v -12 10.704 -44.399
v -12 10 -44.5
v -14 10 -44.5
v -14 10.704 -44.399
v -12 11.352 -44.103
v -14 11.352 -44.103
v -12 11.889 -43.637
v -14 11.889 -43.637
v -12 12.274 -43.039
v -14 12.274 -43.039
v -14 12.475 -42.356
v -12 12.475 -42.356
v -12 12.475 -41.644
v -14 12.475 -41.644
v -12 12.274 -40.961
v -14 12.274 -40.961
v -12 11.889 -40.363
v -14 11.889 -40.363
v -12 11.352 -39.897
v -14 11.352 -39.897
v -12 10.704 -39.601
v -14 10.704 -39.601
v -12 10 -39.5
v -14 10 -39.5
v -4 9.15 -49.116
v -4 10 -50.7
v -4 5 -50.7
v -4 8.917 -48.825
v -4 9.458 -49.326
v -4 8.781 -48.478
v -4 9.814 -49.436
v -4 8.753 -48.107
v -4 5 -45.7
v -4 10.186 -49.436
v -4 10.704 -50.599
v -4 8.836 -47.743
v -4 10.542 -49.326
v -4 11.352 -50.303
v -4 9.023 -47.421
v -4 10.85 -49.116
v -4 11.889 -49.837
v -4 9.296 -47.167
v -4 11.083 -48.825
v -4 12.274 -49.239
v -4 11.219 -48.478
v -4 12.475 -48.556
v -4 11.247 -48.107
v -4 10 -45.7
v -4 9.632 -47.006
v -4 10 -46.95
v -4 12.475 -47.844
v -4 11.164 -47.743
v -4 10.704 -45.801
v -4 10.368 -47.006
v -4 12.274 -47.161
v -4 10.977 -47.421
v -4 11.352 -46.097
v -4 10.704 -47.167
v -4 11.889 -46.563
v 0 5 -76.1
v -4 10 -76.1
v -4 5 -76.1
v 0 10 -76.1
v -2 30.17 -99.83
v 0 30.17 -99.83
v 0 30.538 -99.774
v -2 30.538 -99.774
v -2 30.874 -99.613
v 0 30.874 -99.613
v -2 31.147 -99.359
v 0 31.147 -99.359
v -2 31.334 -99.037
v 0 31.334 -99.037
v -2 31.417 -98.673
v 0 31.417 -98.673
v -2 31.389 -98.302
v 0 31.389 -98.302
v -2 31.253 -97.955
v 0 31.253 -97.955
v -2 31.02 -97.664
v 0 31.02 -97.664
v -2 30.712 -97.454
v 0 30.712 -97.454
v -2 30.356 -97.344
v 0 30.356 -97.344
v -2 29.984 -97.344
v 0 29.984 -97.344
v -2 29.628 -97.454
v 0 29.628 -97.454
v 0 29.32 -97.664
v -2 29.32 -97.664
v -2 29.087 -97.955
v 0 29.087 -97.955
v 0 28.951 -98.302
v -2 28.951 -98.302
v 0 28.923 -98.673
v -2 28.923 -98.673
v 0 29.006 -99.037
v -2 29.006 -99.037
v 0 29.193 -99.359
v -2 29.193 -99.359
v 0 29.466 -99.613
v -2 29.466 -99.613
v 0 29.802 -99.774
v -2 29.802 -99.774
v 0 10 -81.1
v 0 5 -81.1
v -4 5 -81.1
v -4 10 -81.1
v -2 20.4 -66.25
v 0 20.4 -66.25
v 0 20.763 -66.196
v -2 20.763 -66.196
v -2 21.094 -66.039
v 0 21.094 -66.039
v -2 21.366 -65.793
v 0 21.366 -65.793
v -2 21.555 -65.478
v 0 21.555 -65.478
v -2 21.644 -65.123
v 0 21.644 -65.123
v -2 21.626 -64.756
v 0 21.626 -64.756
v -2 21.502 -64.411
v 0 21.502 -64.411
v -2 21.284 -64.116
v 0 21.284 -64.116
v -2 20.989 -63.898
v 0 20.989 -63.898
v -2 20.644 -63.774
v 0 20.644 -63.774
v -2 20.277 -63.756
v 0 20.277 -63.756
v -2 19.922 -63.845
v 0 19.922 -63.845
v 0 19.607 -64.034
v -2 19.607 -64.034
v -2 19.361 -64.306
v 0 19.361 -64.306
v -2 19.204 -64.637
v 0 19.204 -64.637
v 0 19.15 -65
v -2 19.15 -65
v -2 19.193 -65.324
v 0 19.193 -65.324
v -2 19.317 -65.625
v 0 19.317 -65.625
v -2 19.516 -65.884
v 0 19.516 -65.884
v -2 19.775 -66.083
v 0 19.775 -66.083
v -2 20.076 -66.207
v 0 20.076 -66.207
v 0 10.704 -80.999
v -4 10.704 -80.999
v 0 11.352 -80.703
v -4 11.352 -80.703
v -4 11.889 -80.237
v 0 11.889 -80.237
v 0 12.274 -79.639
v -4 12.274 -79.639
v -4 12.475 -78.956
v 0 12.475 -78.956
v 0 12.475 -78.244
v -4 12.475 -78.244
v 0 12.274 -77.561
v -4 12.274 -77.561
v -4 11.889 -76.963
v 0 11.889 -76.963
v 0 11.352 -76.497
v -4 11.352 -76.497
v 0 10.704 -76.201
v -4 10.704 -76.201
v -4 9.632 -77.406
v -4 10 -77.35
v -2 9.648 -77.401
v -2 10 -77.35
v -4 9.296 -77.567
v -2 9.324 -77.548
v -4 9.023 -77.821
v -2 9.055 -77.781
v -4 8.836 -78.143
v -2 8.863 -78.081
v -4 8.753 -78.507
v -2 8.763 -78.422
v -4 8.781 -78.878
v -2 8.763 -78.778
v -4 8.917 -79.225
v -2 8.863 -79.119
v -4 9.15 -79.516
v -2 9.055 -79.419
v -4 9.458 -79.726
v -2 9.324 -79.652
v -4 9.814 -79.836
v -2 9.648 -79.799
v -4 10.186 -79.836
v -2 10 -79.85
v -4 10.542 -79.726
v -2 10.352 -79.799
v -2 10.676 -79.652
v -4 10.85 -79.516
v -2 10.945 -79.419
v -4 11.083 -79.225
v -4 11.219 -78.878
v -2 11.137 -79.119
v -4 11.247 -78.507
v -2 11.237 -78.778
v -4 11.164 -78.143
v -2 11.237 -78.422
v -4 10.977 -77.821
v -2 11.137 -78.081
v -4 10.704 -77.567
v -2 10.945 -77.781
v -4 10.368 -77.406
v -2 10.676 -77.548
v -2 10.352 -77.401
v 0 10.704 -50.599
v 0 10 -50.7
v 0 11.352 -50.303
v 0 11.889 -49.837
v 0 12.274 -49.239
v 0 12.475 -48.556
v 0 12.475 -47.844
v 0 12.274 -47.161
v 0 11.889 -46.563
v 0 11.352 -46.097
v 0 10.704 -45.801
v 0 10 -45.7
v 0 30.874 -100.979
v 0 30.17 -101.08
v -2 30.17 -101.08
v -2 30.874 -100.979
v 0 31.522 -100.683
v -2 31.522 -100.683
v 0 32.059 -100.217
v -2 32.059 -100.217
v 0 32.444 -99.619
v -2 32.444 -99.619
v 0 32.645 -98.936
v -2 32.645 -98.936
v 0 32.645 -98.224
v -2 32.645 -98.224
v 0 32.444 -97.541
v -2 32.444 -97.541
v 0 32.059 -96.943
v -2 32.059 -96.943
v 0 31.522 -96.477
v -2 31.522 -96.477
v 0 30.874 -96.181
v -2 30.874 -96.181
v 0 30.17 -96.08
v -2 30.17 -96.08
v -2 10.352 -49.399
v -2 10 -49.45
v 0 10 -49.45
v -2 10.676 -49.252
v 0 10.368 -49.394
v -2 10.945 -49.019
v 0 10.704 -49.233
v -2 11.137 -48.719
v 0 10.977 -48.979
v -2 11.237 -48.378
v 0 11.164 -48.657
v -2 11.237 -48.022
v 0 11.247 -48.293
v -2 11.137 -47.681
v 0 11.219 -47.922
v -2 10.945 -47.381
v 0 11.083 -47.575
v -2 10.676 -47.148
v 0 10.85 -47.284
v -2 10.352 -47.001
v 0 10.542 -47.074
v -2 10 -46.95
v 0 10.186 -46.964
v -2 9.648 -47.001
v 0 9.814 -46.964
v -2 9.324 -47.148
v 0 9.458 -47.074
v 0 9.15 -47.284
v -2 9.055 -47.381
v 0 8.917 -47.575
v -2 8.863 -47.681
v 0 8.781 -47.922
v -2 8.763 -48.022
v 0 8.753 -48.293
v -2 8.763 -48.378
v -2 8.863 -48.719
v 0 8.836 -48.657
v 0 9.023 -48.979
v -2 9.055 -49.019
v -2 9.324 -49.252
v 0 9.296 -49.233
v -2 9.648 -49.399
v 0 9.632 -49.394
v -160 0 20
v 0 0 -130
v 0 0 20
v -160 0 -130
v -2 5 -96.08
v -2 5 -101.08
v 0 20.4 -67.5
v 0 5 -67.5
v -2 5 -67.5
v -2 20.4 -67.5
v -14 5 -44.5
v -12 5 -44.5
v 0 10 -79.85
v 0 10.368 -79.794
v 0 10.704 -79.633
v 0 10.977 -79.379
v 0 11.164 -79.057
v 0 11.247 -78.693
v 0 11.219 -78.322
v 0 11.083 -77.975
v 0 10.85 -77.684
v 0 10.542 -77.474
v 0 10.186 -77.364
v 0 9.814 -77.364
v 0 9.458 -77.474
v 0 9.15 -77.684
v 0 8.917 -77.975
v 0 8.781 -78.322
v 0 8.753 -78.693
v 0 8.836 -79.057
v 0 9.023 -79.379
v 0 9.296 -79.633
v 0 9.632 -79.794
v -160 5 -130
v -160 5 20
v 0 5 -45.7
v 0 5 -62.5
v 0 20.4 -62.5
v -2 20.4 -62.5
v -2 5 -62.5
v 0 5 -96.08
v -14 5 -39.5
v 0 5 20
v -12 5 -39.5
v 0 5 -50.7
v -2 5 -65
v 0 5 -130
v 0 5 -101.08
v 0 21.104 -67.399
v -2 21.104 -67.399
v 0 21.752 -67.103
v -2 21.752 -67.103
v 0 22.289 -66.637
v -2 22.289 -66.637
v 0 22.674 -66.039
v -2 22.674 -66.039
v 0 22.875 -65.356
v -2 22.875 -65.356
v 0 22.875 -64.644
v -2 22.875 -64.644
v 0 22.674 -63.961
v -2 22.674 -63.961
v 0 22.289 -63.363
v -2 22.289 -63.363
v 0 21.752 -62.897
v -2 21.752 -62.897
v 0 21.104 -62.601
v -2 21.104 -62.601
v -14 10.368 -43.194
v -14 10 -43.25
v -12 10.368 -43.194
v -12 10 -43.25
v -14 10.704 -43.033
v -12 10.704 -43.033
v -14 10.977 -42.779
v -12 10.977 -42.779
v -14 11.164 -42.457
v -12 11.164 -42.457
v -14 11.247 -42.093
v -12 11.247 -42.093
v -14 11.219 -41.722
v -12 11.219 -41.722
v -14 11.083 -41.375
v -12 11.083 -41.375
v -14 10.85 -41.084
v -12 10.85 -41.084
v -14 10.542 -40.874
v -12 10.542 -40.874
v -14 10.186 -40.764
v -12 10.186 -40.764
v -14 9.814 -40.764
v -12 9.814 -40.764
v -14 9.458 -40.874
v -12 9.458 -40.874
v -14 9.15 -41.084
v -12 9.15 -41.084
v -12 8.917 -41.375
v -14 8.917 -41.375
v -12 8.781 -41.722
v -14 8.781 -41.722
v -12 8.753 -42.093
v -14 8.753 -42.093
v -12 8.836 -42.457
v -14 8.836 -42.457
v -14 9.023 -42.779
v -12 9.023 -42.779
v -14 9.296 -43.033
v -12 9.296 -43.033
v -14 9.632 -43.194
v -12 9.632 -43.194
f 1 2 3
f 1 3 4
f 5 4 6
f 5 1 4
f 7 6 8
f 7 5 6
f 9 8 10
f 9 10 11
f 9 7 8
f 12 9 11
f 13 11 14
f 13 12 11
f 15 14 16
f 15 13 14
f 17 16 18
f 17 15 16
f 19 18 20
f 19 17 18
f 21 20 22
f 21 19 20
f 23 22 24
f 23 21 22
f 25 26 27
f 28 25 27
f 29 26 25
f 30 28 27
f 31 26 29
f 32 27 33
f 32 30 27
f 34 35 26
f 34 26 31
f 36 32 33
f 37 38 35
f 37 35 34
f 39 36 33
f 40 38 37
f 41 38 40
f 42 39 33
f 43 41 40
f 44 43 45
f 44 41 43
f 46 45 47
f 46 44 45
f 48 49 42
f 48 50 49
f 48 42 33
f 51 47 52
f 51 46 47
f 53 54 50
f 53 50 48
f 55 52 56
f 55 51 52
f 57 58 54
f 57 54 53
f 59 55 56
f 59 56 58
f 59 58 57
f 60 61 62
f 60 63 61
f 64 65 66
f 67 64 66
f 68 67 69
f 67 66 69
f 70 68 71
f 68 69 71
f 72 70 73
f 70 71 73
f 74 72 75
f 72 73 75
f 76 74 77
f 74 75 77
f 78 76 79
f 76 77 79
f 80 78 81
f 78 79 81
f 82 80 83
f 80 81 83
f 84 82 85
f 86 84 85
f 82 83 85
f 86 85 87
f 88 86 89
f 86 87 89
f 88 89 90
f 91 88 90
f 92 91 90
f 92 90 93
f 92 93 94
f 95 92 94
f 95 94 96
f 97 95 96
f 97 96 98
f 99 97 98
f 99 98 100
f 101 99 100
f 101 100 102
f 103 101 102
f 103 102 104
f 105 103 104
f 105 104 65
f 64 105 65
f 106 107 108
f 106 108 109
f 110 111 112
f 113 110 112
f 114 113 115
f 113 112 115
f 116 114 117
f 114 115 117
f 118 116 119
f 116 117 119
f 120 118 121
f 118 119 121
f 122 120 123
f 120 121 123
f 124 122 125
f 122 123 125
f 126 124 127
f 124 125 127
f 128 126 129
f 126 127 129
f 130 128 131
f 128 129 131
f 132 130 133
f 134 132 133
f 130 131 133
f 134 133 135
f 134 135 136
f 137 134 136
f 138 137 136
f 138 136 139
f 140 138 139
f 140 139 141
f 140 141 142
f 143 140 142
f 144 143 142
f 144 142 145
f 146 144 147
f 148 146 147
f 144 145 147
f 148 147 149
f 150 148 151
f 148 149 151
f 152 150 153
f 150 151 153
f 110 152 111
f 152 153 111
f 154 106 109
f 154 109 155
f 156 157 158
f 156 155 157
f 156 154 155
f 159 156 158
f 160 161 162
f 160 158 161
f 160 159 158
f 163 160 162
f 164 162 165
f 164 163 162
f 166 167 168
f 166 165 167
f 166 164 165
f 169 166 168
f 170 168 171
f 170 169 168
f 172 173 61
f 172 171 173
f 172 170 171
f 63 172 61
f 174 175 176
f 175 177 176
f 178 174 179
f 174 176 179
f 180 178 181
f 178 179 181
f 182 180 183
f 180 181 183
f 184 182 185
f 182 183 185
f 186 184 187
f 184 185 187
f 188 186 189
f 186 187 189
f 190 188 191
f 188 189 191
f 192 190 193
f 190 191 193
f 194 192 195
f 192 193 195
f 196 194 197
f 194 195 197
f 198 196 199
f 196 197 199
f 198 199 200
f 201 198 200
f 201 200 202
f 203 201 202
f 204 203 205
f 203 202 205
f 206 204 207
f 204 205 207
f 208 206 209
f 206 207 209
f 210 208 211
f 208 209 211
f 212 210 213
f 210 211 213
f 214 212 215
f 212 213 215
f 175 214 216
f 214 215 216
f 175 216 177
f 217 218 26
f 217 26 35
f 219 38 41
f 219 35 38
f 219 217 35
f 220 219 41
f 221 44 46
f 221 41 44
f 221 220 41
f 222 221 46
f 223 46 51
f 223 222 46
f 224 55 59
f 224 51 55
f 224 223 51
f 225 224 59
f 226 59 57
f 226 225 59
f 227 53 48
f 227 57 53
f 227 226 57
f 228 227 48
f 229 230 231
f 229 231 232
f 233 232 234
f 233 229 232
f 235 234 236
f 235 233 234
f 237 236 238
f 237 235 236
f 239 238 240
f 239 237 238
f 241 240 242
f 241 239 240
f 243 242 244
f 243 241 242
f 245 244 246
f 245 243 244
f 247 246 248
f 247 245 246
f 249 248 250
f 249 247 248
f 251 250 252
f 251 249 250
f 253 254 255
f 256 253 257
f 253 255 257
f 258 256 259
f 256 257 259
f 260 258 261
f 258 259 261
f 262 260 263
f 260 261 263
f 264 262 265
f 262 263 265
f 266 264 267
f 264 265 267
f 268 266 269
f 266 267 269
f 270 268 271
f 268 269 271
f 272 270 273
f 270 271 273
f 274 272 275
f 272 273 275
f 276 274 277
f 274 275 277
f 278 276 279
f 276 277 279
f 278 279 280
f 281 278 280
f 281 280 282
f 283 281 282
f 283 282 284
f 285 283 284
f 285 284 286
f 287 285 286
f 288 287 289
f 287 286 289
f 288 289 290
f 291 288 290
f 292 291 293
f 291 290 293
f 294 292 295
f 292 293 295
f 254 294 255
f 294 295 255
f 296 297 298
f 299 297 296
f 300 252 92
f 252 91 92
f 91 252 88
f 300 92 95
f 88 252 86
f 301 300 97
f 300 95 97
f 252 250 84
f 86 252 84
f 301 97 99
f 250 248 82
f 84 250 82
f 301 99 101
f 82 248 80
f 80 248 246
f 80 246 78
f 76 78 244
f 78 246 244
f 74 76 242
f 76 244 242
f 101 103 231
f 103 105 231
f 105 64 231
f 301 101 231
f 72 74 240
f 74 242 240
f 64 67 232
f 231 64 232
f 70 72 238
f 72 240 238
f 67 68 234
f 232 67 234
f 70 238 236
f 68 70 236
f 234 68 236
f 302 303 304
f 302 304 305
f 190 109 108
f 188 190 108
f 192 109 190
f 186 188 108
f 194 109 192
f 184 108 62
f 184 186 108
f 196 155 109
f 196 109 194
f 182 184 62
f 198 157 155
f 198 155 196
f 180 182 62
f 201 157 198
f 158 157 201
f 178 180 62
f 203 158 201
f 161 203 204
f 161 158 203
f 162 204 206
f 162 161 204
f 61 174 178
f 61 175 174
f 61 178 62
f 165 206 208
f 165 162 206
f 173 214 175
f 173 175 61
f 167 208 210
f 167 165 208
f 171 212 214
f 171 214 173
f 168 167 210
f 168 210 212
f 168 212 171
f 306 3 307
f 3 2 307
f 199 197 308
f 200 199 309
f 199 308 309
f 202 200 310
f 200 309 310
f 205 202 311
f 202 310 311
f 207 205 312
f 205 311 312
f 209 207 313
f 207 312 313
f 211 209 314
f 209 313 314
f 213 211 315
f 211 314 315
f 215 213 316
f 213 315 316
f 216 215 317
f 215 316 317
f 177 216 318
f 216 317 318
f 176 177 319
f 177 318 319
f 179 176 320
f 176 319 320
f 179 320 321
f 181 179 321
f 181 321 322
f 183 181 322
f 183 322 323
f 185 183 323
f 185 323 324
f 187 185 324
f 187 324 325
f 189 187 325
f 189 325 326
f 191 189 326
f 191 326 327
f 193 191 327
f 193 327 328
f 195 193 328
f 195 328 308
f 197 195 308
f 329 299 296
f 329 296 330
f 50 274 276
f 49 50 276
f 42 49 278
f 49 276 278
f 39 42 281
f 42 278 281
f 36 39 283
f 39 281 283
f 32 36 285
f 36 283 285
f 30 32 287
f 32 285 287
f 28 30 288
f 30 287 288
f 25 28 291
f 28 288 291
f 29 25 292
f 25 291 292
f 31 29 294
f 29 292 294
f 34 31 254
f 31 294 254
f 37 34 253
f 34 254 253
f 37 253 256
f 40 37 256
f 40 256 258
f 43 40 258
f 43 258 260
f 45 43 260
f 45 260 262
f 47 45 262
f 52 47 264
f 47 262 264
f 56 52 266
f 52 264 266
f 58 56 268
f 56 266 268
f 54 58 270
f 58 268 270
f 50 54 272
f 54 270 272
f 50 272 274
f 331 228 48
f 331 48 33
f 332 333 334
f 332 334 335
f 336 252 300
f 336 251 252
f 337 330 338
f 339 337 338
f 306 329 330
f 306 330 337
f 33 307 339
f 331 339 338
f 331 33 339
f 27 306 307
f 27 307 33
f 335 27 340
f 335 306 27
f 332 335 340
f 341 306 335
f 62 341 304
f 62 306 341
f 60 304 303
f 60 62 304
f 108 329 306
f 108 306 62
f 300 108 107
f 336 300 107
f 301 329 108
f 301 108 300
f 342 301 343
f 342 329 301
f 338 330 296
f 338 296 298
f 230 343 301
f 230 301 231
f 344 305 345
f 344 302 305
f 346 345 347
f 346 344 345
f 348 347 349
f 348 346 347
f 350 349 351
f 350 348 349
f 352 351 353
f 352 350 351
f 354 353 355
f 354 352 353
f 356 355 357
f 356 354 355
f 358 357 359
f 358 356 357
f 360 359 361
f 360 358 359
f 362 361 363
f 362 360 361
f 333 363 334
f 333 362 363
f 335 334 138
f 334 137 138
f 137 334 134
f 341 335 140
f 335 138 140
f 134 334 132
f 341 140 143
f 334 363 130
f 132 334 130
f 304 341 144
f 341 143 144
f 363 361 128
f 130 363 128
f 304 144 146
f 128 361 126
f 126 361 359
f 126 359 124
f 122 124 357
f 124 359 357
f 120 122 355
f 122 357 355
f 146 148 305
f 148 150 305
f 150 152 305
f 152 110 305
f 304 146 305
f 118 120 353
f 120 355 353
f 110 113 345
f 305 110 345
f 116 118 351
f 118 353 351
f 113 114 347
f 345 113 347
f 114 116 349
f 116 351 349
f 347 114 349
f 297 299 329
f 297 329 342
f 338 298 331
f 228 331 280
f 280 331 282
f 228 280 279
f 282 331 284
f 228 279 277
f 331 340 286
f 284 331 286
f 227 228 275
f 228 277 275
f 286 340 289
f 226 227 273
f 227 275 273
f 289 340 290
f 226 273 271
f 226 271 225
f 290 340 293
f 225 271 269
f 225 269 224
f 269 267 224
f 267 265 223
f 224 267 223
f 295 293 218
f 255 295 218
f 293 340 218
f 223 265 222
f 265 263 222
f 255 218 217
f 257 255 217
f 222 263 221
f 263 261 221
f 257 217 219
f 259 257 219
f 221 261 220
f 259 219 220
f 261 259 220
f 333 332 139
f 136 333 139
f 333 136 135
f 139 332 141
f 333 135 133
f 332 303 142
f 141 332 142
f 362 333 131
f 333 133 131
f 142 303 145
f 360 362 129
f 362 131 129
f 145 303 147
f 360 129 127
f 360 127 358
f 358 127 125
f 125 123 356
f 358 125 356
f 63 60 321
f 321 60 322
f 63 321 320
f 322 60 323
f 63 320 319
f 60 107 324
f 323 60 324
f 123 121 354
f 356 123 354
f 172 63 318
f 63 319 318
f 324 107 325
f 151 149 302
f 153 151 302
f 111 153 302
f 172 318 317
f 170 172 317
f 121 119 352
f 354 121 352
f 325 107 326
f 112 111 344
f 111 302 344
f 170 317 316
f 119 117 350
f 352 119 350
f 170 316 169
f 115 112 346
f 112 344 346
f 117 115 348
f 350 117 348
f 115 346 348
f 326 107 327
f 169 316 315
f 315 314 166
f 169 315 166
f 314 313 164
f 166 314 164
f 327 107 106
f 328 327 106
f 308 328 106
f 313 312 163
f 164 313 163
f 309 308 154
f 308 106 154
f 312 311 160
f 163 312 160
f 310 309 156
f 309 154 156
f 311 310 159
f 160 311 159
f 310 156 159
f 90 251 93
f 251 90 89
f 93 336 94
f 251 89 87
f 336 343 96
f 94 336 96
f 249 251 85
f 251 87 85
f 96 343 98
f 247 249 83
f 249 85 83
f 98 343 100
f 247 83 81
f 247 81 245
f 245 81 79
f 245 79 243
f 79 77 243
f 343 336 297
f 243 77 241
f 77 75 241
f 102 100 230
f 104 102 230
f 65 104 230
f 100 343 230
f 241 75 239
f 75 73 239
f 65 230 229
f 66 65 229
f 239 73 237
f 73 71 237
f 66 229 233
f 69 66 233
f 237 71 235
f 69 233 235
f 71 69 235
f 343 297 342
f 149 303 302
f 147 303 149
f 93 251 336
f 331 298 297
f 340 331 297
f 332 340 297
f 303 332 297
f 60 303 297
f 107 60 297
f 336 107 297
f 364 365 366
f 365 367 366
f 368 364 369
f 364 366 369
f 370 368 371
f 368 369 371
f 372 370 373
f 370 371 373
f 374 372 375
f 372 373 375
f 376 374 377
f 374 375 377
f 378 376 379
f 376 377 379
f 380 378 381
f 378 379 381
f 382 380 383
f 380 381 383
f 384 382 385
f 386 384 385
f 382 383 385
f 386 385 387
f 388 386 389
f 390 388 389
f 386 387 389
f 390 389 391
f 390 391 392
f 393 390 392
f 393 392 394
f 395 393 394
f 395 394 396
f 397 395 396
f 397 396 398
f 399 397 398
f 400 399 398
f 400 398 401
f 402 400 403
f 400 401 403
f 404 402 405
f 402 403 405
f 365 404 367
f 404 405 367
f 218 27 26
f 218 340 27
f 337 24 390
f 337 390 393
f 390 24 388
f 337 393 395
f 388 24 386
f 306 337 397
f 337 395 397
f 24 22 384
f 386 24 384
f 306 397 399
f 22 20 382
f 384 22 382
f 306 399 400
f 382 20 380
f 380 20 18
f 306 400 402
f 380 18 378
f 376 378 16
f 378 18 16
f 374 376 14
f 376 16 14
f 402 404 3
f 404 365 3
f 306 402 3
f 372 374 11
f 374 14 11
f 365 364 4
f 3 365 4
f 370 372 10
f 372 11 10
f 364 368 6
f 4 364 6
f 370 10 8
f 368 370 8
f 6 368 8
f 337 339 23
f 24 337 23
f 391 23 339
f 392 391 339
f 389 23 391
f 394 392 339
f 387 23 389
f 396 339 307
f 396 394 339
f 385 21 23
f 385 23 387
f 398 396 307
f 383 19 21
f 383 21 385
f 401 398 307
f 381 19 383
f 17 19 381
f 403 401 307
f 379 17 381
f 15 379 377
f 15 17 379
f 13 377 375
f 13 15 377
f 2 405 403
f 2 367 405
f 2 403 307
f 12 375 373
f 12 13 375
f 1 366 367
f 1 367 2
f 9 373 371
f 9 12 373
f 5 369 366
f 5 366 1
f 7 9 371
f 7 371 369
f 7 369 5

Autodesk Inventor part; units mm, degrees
ref_plane "YZ Plane" through (0, 0, 0) normal (1, 0, 0) x (0, 1, 0)
ref_plane "XZ Plane" through (0, 0, 0) normal (0, 1, 0) x (-1, 0, 0)
sketch "草圖1" plane through (0, 0, 0) normal (0, 1, 0) x (-1, 0, 0)
  line L0 (0, 0) -> (160, 0)
  line L1 (160, 0) -> (160, -130)
  line L2 (160, -130) -> (0, -130)
  line L3 (0, -130) -> (0, 0)
  dimension "d0" = 160
  dimension "d1" = 130
extrude "擠出1" add sketch "草圖1" along normal blind 5
sketch "草圖2" plane through (0, 0, 0) normal (1, 0, 0) x (0, 0, -1)
  line L0 (130, 0) -> (0, 0) projected
  line L1 (65, 0) -> (65, 20.4)
  line L2 (65, 20.4) -> (65, 0) construction
  line L3 (62.5, 20.4) -> (62.5, 0)
  line L4 (67.5, 0) -> (67.5, 20.4)
  arc A0 (67.5, 20.4) -> (62.5, 20.4) centre (65, 20.4) ccw
  arc A1 (62.5, 0) -> (67.5, 0) centre (65, 0) ccw construction
  line L5 (67.5, 0) -> (62.5, 0)
  circle A2 centre (65, 20.4) radius 1.25
  point P0 (65, 10.2)
  dimension "d4" = 20.4
  dimension "d5" = 5
  dimension "d6" = 2.5
extrude "擠出2" add sketch "草圖2" against normal blind 2
sketch "草圖3" plane through (0, 0, 0) normal (1, 0, 0) x (0, 0, -1)
  line L0 (130, 0) -> (0, 0) construction
  arc A0 (67.5, 20.4) -> (62.5, 20.4) centre (65, 20.4) ccw projected
  line L1 (65, 20.4) -> (48.2, 20.4) construction
  line L2 (48.2, 20.4) -> (48.2, 10) construction
  line L3 (48.2, 10) -> (48.2, 0) construction
  line L4 (45.7, 10) -> (45.7, 0)
  line L5 (50.7, 0) -> (50.7, 10)
  arc A1 (50.7, 10) -> (45.7, 10) centre (48.2, 10) ccw
  arc A2 (45.7, 0) -> (50.7, 0) centre (48.2, 0) ccw construction
  circle A3 centre (48.2, 10) radius 1.25
  line L6 (50.7, 0) -> (45.7, 0)
  line L7 (65, 20.4) -> (42, 20.4) construction
  line L8 (42, 20.4) -> (42, 10) construction
  line L9 (42, 10) -> (42, 0) construction
  line L10 (39.5, 10) -> (39.5, 0)
  line L11 (44.5, 0) -> (44.5, 10)
  arc A4 (44.5, 10) -> (39.5, 10) centre (42, 10) ccw
  arc A5 (39.5, 0) -> (44.5, 0) centre (42, 0) ccw construction
  circle A6 centre (42, 10) radius 1.25
  line L12 (44.5, 0) -> (39.5, 0)
  circle A7 centre (65, 20.4) radius 1.25 projected
  line L13 (65, 20.4) -> (78.6, 20.4) construction
  line L14 (78.6, 20.4) -> (78.6, 10) construction
  line L15 (78.6, 10) -> (78.6, 0) construction
  line L16 (76.1, 10) -> (76.1, 0)
  line L17 (81.1, 0) -> (81.1, 10)
  arc A8 (81.1, 10) -> (76.1, 10) centre (78.6, 10) ccw
  arc A9 (76.1, 0) -> (81.1, 0) centre (78.6, 0) ccw construction
  circle A10 centre (78.6, 10) radius 1.25
  line L18 (81.1, 0) -> (76.1, 0)
  line L19 (81.1, 0) -> (76.1, 0)
  line L20 (0, 0) -> (130, 0) projected
  line L21 (65, 20.4) -> (65, 30.17) construction
  line L22 (65, 30.17) -> (98.58, 30.17) construction
  line L23 (98.58, 30.17) -> (98.58, 0) construction
  line L24 (96.08, 30.17) -> (96.08, 0)
  line L25 (101.08, 0) -> (101.08, 30.17)
  arc A11 (101.08, 30.17) -> (96.08, 30.17) centre (98.58, 30.17) ccw
  arc A12 (96.08, 0) -> (101.08, 0) centre (98.58, 0) ccw construction
  circle A13 centre (98.58, 30.17) radius 1.25
  line L26 (101.08, 0) -> (96.08, 0)
  point P0 (48.2, 5)
  point P1 (42, 5)
  point P2 (78.6, 5)
  point P3 (98.58, 15.085)
  dimension "d9" = 16.8
  dimension "d11" = 10.4
  dimension "d12" = 5
  dimension "d13" = 2.5
  dimension "d14" = 23
  dimension "d15" = 10.4
  dimension "d16" = 5
  dimension "d17" = 2.5
  dimension "d20" = 13.6
  dimension "d21" = 10.4
  dimension "d22" = 5
  dimension "d23" = 2.5
  dimension "d24" = 9.77
  dimension "d25" = 33.58
  dimension "d26" = 5
  dimension "d27" = 2.5
extrude "擠出3" add sketch "草圖3" against normal blind 2 contours A1 L5 L6 L4 | L24 A11 L25 L20 | L16 A8 L17 L18 | L12 L10 A4 L11
sketch "草圖4" plane through (-160, 0, 0) normal (0, 0, 1) x (1, 0, 0)
  line L0 (160, 0) -> (0, 0) projected
  line L1 (160, 0) -> (160, 5) projected
  line L2 (0, 5) -> (160, 5) projected
  line L3 (0, 0) -> (0, 5) projected
extrude "擠出4" add sketch "草圖4" along normal blind 20
sketch "草圖5" plane through (-2, 0, 0) normal (-1, 0, 0) x (0, 0, 1)
  line L0 (-45.7, 5) -> (-50.7, 5) projected
  line L1 (-45.7, 5) -> (-45.7, 10) projected
  arc A0 (-45.7, 10) -> (-50.7, 10) centre (-48.2, 10) ccw projected
  line L2 (-50.7, 10) -> (-50.7, 5) projected
  circle A1 centre (-48.2, 10) radius 1.25 projected
  line L3 (-76.1, 5) -> (-81.1, 5) projected
  line L4 (-76.1, 5) -> (-76.1, 10) projected
  arc A2 (-76.1, 10) -> (-81.1, 10) centre (-78.6, 10) ccw projected
  line L5 (-81.1, 10) -> (-81.1, 5) projected
  circle A3 centre (-78.6, 10) radius 1.25 projected
  point P0 (0, 0)
extrude "擠出5" add sketch "草圖5" along normal blind 2
ref_plane "工作平面1" through (-12, 0, -130) normal (1, 0, 0) x (0, 0, -1)
sketch "草圖6" plane through (-12, 0, -130) normal (1, 0, 0) x (0, 0, -1)
  line L0 (-90.5, 5) -> (-85.5, 5) projected
  line L1 (-90.5, 5) -> (-90.5, 10) projected
  arc A0 (-85.5, 10) -> (-90.5, 10) centre (-88, 10) ccw projected
  line L2 (-85.5, 10) -> (-85.5, 5) projected
  circle A1 centre (-88, 10) radius 1.25 projected
  point P0 (-130, 0)
extrude "擠出6" add sketch "草圖6" against normal blind 2
extrude "擠出7" cut sketch "草圖6" along normal blind 20
